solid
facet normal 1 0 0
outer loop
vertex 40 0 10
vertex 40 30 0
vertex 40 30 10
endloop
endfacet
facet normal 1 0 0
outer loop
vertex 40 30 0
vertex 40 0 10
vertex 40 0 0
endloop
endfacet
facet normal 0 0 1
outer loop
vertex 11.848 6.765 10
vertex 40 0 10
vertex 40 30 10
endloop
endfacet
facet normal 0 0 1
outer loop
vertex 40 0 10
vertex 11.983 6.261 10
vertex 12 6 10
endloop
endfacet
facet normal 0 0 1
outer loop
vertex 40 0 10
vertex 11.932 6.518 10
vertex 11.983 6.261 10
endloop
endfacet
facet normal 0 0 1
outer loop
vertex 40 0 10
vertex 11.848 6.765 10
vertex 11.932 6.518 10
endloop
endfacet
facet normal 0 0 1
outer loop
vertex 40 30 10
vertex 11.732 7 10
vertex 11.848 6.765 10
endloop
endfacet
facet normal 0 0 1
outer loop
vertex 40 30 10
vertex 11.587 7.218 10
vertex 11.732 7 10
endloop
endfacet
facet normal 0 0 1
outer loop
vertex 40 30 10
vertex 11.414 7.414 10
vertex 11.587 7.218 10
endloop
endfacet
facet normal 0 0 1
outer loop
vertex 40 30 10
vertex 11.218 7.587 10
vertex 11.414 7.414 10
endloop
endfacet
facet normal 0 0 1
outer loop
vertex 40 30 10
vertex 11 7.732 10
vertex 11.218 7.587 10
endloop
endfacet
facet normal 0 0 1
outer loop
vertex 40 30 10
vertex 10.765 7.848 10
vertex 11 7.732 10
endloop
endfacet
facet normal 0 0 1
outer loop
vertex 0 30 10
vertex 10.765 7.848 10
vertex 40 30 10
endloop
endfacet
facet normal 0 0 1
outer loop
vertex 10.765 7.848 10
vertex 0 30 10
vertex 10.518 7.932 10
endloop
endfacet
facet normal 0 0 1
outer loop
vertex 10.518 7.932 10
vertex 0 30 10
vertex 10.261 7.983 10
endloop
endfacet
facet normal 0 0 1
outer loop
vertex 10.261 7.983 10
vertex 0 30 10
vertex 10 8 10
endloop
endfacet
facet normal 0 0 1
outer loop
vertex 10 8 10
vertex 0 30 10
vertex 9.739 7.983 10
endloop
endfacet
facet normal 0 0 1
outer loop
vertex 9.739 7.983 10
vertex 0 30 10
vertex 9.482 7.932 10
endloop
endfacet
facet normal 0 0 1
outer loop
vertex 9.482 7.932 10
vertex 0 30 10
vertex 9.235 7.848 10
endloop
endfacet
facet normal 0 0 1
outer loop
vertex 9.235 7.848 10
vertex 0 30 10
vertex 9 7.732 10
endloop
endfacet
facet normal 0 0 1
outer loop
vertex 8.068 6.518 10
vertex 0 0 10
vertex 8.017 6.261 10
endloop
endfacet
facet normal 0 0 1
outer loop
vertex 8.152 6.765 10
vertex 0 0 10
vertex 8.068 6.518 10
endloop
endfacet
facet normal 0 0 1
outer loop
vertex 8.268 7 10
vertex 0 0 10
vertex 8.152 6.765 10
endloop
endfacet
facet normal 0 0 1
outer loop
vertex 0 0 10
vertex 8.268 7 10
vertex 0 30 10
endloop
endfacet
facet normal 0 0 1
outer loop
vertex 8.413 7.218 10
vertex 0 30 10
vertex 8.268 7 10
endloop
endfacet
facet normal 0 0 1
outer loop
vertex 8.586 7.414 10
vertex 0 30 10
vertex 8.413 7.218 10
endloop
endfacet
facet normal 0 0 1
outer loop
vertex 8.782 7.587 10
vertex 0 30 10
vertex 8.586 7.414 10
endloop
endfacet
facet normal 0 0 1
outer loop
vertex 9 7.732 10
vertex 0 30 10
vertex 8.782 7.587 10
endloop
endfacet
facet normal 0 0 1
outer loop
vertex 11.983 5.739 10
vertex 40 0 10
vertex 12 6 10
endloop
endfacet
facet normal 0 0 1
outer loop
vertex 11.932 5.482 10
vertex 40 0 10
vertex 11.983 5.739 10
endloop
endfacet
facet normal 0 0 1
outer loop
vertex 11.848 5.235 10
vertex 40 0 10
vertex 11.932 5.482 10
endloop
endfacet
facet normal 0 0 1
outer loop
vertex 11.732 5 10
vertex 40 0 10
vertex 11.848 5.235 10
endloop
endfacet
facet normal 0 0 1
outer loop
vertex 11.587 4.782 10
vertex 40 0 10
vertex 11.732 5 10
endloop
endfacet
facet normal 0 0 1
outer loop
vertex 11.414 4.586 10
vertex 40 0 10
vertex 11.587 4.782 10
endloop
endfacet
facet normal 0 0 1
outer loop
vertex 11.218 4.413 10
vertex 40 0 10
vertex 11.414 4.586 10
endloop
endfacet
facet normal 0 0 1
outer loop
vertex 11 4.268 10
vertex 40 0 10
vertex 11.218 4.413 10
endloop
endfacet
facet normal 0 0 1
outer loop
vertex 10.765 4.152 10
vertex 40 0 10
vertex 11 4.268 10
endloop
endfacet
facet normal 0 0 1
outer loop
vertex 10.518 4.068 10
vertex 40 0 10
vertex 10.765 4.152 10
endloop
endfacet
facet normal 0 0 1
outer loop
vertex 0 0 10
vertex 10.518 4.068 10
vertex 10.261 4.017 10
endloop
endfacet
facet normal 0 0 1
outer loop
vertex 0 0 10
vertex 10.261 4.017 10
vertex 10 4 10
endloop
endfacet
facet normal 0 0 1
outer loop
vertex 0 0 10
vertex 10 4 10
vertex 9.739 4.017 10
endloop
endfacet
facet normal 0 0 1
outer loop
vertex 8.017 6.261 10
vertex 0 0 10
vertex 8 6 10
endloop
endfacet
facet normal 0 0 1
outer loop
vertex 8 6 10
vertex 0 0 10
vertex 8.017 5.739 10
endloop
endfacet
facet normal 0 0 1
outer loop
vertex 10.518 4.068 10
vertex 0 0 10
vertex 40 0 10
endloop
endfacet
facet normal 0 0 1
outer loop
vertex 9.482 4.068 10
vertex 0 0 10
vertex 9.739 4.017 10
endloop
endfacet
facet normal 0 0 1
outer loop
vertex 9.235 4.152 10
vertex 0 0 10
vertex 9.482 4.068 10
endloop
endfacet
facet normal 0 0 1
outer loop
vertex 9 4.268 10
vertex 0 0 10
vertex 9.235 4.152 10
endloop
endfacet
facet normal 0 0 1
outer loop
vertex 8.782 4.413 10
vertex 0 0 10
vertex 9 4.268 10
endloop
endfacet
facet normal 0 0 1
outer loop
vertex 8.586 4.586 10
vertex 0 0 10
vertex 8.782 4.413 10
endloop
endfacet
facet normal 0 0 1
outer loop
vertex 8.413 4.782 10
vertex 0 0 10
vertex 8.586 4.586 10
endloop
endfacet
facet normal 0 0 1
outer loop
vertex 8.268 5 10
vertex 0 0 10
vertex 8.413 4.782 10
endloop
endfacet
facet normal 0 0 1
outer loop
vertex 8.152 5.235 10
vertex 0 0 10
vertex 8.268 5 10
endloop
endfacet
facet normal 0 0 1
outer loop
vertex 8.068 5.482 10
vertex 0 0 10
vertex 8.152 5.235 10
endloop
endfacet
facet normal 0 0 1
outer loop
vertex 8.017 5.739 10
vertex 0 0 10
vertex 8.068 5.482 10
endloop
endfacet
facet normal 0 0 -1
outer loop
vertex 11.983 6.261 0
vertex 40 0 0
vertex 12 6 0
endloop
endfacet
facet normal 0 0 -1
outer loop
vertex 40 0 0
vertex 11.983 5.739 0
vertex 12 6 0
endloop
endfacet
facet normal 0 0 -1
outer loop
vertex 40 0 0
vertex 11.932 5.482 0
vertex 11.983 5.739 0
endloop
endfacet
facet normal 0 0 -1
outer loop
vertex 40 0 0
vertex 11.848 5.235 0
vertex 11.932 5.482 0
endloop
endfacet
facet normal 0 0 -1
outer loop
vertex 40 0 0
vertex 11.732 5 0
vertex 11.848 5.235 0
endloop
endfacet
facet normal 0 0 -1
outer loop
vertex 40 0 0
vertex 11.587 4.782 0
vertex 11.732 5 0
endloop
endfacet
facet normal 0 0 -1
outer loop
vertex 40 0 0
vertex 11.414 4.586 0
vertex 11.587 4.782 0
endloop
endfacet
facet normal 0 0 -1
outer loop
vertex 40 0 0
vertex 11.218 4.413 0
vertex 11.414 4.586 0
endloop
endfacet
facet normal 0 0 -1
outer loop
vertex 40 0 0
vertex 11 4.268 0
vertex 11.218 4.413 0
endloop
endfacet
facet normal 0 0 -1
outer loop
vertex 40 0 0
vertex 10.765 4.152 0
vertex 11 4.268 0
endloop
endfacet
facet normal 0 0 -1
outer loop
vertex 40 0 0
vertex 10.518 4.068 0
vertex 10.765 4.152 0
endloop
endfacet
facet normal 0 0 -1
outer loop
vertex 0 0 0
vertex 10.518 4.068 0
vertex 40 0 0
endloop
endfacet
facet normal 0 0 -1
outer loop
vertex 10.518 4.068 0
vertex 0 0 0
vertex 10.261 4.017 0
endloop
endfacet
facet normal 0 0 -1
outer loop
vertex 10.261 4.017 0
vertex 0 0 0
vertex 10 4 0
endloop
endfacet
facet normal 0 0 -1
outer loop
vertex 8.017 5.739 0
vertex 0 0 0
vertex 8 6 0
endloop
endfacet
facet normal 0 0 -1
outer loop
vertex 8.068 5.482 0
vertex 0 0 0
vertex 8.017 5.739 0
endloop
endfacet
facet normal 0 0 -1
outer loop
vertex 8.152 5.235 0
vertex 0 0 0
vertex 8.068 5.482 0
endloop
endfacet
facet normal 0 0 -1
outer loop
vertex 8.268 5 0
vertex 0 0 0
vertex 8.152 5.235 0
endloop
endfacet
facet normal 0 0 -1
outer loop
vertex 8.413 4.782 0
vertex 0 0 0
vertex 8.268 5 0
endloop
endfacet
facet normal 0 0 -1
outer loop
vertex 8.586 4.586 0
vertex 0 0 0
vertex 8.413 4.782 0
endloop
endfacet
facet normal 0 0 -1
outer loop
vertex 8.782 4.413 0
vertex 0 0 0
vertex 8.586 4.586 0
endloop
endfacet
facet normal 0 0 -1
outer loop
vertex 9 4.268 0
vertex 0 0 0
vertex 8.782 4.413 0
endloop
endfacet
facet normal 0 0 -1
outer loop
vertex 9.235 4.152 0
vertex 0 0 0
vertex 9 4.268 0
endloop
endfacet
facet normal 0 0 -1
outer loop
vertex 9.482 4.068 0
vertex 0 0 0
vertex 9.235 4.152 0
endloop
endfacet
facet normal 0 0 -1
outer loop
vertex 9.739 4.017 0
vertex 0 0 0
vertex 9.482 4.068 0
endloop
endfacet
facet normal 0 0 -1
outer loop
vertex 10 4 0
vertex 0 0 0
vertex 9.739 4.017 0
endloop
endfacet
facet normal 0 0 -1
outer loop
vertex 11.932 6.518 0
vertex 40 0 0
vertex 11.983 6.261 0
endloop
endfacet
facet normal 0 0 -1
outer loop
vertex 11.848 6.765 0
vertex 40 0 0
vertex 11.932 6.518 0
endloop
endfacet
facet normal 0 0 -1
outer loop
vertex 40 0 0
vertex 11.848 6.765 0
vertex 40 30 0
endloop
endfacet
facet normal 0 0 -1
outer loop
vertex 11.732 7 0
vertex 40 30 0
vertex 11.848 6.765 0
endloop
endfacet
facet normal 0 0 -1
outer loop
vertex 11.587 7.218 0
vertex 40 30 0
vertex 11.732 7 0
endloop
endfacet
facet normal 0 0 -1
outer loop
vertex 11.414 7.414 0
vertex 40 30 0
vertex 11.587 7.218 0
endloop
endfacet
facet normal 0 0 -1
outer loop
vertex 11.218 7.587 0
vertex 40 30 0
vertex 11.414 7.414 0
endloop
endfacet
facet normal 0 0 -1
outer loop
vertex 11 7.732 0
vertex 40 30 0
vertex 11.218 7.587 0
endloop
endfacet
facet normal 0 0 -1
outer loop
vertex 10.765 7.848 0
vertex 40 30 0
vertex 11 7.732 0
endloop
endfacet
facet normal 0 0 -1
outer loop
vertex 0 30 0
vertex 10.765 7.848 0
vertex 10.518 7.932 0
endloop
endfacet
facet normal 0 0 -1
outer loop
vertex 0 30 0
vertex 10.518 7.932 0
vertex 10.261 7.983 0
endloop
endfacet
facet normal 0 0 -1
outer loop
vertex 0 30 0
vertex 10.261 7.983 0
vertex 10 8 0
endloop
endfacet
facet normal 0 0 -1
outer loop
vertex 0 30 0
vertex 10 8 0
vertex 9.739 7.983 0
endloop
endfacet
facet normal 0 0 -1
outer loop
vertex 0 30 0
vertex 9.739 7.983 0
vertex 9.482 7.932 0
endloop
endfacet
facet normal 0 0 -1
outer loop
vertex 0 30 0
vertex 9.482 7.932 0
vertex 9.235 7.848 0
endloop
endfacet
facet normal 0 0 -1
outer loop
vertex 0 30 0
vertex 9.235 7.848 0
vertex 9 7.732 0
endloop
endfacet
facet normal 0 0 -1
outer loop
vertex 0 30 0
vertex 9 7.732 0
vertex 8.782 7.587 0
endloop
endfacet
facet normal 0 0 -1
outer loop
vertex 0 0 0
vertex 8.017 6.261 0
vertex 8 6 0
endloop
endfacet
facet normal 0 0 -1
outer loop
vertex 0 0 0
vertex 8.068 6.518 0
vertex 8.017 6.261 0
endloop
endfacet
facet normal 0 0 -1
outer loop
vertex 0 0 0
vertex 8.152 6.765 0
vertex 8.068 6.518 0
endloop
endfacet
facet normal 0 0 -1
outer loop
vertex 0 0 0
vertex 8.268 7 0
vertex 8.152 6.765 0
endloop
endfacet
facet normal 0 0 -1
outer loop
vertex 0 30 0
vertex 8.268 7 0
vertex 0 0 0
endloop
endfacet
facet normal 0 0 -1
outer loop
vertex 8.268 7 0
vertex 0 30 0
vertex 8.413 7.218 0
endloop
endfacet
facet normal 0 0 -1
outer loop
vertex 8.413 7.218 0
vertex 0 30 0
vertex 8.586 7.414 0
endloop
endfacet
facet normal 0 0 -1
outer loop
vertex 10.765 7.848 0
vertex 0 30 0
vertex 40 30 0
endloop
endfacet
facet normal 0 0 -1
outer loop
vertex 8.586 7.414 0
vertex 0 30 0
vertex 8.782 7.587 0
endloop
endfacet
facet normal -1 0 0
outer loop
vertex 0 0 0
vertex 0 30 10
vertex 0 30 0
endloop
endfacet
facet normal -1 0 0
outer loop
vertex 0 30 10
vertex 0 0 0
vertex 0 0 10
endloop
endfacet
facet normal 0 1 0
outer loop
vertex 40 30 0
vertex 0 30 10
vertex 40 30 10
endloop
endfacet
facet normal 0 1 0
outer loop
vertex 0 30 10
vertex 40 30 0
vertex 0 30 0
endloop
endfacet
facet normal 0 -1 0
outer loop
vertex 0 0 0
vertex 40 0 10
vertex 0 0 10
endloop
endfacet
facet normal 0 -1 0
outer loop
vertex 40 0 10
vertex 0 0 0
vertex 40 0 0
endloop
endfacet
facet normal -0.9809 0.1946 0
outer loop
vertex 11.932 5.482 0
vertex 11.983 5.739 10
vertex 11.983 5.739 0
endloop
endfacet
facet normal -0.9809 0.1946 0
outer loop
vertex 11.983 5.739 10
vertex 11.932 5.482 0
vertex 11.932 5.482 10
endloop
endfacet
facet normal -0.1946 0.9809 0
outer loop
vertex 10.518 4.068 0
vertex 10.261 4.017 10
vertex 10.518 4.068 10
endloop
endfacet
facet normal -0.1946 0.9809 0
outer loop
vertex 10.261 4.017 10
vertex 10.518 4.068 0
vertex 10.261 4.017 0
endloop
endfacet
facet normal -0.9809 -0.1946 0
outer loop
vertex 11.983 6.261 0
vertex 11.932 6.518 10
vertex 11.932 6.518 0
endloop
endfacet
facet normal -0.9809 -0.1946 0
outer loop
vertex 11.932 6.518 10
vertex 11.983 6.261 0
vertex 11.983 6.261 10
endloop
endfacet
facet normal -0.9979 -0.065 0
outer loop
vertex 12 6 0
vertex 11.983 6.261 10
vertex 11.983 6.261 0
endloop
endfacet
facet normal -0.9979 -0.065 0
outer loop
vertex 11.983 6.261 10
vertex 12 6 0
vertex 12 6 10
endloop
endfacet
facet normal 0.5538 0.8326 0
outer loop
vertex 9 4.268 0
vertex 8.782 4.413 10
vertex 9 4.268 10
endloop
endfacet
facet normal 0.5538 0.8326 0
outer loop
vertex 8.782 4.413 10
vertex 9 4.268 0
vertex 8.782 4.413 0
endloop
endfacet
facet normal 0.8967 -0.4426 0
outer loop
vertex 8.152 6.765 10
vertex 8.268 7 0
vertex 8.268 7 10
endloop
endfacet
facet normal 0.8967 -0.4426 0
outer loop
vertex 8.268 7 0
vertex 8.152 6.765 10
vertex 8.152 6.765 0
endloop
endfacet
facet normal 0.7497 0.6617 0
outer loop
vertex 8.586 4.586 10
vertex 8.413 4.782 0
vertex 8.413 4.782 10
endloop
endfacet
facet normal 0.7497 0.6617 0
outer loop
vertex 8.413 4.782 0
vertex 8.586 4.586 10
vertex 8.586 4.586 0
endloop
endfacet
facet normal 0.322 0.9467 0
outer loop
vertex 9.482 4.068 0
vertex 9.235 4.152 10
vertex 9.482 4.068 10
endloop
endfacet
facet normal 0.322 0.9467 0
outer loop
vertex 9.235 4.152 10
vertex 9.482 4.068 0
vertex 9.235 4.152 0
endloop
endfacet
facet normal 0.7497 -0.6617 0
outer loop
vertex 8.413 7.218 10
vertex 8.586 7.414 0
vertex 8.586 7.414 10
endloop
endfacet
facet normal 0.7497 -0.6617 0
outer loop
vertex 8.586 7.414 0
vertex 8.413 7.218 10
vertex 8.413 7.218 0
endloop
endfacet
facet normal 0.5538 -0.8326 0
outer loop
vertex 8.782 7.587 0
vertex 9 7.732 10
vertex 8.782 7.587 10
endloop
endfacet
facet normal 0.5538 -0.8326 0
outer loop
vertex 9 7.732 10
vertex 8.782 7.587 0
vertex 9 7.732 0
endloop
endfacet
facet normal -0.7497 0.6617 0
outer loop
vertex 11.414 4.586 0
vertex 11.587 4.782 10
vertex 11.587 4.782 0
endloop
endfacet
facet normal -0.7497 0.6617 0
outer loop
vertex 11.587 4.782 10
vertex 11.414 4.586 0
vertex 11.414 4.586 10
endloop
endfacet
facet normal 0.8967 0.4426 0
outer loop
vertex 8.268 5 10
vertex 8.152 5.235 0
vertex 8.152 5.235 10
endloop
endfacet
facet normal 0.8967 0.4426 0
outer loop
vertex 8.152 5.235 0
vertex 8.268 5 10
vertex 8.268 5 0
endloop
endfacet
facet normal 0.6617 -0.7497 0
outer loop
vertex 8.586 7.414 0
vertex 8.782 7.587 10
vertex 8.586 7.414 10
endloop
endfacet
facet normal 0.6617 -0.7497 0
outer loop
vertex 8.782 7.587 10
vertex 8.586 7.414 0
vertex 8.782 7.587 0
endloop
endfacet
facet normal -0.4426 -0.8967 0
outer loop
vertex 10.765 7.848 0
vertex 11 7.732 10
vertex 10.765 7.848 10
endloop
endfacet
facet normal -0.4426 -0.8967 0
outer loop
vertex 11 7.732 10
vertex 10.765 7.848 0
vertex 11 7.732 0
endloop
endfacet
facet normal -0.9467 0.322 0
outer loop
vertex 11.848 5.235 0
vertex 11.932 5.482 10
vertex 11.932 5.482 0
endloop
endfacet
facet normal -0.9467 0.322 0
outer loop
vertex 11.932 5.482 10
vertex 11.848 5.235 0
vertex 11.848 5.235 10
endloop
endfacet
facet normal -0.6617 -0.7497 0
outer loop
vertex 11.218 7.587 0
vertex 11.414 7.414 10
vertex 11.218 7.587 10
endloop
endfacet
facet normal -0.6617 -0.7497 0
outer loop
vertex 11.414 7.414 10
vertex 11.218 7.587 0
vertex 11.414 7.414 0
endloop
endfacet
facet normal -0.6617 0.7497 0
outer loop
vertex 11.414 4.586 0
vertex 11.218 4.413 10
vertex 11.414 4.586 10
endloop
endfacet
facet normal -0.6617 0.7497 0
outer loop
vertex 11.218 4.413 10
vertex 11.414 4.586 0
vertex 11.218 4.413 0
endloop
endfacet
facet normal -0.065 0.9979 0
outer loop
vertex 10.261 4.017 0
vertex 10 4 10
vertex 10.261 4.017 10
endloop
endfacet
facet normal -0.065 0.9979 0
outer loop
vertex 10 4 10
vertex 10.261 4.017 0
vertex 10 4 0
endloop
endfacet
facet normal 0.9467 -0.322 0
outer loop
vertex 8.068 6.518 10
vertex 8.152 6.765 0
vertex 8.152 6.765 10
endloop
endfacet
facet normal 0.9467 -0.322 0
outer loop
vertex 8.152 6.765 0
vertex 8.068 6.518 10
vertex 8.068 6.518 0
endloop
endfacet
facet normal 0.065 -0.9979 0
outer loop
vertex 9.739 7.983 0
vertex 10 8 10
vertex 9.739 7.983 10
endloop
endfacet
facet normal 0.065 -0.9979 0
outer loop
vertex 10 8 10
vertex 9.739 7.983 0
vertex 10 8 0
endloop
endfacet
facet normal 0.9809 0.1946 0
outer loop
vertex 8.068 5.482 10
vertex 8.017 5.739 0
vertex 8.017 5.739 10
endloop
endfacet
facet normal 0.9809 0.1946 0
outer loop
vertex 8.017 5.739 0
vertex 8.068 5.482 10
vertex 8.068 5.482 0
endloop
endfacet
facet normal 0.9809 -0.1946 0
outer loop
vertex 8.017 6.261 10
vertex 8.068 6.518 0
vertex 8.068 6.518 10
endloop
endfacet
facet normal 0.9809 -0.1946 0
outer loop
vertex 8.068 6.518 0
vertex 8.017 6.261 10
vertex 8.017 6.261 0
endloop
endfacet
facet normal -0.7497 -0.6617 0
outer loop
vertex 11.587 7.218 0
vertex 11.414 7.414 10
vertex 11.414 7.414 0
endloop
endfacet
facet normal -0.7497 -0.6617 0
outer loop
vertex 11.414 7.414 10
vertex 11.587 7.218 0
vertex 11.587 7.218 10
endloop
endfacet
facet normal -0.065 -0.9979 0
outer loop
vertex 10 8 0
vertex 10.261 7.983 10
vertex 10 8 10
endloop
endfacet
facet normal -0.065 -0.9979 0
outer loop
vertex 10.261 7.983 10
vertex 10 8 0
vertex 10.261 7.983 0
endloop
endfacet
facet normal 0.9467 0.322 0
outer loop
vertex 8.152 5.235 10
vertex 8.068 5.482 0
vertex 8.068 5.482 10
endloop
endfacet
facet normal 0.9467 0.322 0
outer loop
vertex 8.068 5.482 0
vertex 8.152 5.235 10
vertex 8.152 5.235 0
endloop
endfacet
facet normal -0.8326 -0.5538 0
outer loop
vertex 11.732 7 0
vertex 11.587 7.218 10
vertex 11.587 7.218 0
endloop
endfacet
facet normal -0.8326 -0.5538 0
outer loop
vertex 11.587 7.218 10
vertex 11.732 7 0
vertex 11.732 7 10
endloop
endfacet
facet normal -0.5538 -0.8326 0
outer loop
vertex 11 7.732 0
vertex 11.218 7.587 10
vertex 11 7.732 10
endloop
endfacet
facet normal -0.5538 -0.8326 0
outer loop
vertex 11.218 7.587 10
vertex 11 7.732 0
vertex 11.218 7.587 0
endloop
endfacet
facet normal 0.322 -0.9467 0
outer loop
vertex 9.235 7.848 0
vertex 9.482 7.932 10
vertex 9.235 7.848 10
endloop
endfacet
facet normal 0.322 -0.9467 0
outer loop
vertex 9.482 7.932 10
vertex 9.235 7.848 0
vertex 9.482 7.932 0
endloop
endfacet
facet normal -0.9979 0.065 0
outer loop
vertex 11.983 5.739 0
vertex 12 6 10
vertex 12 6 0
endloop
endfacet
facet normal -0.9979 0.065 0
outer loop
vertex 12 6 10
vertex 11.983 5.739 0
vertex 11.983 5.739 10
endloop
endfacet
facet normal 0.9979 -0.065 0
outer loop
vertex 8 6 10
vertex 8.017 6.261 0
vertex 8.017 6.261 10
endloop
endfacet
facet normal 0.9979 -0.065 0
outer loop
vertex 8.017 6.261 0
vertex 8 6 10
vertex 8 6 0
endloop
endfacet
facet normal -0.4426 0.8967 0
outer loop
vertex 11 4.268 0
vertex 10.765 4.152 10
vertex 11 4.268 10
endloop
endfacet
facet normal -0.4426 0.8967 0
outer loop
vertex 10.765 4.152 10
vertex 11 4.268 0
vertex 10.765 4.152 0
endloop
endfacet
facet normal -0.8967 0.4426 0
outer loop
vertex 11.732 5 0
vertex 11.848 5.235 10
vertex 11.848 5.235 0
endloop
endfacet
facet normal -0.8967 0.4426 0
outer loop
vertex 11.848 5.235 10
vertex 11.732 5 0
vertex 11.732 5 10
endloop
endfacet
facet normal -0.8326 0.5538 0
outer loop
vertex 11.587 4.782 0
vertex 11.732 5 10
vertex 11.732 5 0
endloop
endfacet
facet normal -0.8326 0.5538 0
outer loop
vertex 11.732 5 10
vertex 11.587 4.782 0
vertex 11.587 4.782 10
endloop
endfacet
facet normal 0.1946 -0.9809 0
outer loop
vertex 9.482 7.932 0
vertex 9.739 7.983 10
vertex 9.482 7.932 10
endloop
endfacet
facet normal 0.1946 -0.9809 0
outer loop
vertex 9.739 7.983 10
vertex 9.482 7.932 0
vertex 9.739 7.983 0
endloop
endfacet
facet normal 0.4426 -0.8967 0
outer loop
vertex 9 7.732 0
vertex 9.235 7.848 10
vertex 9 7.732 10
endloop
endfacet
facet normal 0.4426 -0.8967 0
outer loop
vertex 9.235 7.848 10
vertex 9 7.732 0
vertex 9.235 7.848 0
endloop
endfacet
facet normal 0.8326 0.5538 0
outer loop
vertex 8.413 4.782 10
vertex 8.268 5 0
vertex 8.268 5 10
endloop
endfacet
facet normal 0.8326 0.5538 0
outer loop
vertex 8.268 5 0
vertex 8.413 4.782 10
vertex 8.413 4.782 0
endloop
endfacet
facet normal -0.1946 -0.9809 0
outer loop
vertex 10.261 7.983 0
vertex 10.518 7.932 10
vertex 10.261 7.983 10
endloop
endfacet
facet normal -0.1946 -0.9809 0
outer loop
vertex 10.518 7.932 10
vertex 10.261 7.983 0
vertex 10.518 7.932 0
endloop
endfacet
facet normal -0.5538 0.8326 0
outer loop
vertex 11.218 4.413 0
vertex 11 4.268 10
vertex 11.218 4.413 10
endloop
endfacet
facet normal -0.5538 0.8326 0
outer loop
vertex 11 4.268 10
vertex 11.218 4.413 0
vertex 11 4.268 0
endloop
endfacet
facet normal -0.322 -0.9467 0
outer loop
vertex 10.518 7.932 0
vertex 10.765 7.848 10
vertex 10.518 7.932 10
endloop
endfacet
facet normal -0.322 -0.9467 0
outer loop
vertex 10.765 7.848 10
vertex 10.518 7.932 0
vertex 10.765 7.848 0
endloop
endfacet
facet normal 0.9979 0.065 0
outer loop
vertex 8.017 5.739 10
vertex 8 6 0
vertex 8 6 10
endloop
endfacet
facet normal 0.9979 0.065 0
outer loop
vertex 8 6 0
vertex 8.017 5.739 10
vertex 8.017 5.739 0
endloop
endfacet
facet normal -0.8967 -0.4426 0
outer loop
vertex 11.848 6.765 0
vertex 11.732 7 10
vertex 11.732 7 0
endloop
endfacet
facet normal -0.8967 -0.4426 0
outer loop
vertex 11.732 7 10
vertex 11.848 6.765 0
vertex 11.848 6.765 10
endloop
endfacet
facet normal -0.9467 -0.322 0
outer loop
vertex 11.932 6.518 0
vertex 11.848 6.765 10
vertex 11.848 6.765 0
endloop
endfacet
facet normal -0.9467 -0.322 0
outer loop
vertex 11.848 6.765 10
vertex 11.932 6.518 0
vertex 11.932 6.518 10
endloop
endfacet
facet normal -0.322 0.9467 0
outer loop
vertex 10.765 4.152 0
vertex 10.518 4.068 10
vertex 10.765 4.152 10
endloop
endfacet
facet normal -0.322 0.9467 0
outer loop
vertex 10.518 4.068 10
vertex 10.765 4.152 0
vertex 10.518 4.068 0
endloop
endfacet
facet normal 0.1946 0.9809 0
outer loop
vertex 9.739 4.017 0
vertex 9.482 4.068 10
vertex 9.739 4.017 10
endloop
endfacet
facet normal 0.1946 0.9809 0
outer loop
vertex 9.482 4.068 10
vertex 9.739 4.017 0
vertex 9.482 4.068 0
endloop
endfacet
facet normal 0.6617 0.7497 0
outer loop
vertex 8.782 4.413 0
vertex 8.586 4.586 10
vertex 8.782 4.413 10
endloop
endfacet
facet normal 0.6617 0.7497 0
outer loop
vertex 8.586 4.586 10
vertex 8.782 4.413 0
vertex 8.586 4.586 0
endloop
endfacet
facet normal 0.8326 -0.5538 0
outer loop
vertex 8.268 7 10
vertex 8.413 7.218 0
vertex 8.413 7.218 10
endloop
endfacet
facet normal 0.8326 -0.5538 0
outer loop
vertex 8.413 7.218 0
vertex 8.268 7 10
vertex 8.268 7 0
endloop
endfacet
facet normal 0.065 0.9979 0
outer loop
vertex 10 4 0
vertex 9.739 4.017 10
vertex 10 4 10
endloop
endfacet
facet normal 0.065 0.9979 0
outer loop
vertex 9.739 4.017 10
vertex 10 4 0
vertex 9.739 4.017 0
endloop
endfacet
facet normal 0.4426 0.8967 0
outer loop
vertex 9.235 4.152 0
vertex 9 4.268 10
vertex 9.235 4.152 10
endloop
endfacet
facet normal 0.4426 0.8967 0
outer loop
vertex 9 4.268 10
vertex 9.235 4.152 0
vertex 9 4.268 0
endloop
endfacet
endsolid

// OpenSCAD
// units=mm — generated by scad_emitter.py
// part=unnamed
$fn = 48;

difference() { cube([40, 30, 10]); translate([10, 6, -0.5]) rotate([0, 0, 0]) cylinder(h=11, r=2, $fn=$fn); }
